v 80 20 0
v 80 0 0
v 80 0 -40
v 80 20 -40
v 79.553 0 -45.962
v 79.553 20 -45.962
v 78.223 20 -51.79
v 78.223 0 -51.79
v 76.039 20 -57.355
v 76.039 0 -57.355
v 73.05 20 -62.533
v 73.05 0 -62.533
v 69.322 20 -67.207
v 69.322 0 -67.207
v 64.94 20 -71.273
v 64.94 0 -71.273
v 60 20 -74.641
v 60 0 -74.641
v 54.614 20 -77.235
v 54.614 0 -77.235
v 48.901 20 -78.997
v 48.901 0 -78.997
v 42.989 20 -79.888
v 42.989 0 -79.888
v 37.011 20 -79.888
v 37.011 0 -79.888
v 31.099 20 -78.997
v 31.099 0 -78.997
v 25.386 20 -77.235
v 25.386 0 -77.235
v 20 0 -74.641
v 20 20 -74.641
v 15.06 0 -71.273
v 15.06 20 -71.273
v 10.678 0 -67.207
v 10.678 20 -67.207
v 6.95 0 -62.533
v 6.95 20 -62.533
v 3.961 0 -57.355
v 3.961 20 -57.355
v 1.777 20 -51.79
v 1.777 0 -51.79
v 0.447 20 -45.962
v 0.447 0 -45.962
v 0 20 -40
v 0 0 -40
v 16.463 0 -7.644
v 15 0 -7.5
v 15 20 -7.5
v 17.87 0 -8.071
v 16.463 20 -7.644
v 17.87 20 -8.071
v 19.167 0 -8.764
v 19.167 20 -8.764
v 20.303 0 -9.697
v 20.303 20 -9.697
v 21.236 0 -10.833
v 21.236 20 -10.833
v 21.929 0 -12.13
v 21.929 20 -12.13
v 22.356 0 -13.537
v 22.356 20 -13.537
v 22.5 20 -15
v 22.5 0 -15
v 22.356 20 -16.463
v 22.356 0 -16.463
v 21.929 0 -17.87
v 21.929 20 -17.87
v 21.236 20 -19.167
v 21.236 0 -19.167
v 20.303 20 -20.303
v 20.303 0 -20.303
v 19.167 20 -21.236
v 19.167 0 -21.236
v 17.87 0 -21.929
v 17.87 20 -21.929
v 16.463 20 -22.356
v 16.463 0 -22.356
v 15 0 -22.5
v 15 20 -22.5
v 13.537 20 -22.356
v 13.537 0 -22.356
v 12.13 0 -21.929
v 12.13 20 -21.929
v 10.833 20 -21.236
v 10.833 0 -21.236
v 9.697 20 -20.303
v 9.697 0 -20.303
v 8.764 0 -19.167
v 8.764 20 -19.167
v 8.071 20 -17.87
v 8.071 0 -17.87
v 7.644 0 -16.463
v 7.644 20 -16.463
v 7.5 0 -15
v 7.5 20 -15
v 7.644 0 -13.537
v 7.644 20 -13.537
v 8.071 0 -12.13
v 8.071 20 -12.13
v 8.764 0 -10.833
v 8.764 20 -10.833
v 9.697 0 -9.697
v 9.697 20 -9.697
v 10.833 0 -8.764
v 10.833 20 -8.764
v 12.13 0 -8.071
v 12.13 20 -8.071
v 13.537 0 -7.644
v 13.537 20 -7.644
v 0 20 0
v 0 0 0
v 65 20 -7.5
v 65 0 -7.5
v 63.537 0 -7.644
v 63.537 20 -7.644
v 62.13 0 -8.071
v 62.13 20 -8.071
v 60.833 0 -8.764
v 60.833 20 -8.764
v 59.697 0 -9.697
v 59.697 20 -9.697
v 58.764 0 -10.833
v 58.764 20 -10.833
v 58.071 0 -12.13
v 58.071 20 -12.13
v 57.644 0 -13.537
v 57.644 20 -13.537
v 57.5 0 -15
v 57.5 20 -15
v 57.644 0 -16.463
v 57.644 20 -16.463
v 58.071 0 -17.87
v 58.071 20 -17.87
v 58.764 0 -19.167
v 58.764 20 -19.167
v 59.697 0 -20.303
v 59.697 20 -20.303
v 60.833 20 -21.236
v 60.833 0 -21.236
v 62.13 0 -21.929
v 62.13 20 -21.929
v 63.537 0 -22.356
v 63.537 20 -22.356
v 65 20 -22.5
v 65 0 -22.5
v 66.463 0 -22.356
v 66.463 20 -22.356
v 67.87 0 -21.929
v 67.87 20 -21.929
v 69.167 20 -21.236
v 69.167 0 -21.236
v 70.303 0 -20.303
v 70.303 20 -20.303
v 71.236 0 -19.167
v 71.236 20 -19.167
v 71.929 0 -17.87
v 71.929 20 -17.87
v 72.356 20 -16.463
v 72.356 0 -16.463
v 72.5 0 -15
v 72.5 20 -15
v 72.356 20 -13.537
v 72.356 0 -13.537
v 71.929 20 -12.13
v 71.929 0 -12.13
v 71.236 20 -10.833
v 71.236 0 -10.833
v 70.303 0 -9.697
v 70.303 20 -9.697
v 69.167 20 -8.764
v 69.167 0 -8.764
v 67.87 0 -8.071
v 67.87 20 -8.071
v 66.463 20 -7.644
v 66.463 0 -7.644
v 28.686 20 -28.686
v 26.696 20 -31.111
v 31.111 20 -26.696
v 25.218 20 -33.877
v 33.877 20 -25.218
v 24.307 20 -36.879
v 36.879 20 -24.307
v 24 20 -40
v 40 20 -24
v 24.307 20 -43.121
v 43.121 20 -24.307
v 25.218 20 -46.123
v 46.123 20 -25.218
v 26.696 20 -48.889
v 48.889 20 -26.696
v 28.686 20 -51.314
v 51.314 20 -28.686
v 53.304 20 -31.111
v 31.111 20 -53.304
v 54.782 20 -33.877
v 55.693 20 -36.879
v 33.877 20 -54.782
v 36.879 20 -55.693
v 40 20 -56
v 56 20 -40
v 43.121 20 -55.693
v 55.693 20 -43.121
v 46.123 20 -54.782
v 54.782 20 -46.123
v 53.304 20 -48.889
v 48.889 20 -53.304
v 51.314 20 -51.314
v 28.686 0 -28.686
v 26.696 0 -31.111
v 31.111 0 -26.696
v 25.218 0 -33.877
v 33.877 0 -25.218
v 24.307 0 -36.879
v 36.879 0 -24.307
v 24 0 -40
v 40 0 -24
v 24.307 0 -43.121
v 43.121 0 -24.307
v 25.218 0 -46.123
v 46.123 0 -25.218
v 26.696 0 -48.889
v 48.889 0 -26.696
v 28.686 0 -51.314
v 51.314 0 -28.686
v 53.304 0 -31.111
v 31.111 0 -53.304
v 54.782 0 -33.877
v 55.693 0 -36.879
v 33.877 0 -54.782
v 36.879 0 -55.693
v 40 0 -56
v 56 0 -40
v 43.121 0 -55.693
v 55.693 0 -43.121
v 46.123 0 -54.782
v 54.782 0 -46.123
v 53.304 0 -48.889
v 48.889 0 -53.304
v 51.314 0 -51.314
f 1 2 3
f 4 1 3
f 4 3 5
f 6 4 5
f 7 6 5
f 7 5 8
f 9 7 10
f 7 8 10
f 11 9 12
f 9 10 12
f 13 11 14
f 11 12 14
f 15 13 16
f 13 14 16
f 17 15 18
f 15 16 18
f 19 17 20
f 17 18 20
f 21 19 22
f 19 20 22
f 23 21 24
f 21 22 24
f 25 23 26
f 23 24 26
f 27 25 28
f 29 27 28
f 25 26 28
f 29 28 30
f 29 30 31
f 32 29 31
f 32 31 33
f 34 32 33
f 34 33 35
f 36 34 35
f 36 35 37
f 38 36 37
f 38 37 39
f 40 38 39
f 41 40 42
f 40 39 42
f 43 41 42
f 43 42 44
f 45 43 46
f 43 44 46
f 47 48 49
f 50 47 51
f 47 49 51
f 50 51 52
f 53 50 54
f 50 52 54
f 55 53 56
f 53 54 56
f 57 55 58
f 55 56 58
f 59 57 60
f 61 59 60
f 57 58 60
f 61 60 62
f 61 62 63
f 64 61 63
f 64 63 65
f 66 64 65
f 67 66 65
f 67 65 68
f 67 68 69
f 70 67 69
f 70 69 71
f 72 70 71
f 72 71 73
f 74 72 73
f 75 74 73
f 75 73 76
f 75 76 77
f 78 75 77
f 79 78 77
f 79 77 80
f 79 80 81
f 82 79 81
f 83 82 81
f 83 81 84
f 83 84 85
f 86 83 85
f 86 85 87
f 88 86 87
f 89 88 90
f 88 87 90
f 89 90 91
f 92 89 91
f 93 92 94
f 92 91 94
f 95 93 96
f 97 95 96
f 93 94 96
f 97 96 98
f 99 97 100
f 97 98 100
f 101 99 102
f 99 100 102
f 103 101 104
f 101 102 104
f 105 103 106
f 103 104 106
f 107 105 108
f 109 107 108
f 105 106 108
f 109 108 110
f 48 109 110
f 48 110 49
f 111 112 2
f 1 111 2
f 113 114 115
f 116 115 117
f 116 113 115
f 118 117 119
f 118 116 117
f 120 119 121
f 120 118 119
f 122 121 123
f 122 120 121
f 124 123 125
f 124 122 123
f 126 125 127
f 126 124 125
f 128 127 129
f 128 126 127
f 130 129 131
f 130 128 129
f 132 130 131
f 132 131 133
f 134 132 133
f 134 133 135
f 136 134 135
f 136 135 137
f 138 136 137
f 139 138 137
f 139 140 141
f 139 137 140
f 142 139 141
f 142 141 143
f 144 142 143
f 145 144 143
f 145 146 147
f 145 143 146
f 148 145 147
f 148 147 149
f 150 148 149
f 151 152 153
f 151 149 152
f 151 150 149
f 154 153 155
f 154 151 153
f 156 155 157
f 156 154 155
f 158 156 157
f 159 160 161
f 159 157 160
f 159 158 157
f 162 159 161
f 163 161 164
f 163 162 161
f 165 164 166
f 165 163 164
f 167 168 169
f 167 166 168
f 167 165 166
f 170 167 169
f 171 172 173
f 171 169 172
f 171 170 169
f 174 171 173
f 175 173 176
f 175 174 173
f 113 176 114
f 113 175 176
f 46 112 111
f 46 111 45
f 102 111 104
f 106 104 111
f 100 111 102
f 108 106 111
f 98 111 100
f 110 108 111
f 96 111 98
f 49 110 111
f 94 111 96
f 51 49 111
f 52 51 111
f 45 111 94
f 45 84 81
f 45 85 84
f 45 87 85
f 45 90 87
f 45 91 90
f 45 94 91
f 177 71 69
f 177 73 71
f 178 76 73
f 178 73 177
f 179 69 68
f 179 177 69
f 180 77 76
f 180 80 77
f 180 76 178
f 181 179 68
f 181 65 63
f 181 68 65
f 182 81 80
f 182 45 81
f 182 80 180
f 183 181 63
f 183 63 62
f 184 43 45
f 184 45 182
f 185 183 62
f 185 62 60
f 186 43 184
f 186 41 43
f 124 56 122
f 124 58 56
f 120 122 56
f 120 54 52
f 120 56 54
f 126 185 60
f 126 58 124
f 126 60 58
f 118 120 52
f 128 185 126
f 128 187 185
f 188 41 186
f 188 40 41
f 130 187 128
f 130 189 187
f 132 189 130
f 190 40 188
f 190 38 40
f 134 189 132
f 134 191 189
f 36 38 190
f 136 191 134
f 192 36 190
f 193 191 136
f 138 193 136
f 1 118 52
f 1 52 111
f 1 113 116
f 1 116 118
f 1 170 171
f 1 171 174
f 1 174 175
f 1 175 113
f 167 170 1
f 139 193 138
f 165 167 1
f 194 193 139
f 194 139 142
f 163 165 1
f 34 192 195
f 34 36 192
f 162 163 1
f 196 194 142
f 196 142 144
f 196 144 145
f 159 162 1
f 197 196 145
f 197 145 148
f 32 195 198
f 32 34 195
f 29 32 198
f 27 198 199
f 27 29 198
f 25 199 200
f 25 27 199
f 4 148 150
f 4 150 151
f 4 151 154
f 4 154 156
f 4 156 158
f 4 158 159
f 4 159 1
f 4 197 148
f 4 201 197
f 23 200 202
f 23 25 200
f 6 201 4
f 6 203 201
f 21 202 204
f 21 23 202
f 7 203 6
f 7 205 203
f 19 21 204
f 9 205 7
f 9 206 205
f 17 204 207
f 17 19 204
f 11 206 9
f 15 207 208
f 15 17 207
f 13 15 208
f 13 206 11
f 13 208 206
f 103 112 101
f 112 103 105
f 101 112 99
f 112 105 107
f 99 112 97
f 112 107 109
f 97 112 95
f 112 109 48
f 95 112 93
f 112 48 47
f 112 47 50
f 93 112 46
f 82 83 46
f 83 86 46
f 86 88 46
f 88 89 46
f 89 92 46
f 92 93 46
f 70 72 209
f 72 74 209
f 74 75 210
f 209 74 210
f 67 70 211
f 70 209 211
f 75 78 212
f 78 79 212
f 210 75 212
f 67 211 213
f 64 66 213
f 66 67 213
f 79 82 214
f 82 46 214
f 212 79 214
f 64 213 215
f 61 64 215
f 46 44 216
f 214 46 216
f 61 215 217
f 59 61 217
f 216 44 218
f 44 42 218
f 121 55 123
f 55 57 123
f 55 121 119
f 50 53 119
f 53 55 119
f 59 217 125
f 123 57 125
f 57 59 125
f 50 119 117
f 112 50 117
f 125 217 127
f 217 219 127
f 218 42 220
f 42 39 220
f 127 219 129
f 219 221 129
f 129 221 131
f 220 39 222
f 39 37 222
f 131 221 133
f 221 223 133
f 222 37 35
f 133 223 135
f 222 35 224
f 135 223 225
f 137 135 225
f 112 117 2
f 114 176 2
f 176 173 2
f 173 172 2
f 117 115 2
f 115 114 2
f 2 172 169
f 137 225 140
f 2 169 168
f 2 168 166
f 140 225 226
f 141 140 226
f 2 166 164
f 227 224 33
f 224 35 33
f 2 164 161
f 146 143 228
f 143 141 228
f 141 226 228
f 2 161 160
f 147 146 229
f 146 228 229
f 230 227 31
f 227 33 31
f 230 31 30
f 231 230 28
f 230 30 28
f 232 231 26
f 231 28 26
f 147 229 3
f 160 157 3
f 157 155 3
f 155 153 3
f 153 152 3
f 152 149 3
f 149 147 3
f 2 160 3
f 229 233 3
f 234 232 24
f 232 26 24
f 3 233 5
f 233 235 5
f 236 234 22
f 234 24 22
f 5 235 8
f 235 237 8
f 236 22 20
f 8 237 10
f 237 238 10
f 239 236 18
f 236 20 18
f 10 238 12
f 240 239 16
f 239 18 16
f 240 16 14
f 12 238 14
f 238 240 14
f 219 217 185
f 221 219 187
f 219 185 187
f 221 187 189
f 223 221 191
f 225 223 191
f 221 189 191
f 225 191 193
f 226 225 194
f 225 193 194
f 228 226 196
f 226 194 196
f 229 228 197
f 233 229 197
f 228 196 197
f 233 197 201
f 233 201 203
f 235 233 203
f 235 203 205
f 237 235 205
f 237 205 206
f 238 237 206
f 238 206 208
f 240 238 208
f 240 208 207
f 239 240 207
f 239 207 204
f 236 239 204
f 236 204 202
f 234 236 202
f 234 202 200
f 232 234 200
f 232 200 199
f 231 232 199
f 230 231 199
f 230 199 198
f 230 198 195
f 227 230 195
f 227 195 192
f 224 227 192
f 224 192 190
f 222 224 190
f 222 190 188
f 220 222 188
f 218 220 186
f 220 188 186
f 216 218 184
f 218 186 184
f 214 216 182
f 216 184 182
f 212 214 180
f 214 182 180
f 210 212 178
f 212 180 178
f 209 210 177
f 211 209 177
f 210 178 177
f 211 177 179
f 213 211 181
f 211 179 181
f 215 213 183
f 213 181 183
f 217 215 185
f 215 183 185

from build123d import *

# Parameters (mm, degrees)
SKETCH1_R          = 40
SKETCH1_W          = 80
SKETCH1_H          = 40
EXTRUDE1_DEPTH     = 20
SKETCH3_R          = 16
CUT_EXTRUDE1_DEPTH = 115.891252931
SKETCH7_R          = 7.5
CUT_EXTRUDE2_DEPTH = 115.891252931


with BuildPart() as part:
    # Sketch1 → Extrude1 (new body)
    with BuildSketch(Plane(origin=(0, 0, 0), x_dir=(1, 0, 0), z_dir=(0, 1, 0))):
        with Locations((40, 40)):
            Circle(SKETCH1_R)
        with Locations((40, 20)):
            Rectangle(SKETCH1_W, SKETCH1_H)
    extrude(amount=EXTRUDE1_DEPTH)

    # Sketch3 → Cut-Extrude1 (cut, through all)
    with BuildSketch(Plane(origin=(0, 20, 0), x_dir=(1, 0, 0), z_dir=(0, 1, 0))):
        with Locations(Location((40, 40, 0), (0, 0, 270))):
            Circle(SKETCH3_R)
    extrude(amount=-CUT_EXTRUDE1_DEPTH, mode=Mode.SUBTRACT)

    # Sketch7 → Cut-Extrude2 (cut, through all)
    with BuildSketch(Plane(origin=(0, 20, 0), x_dir=(1, 0, 0), z_dir=(0, 1, 0))):
        with Locations(Location((15, 15, 0), (0, 0, 270))):
            Circle(SKETCH7_R)
    cut_extrude2 = extrude(amount=-CUT_EXTRUDE2_DEPTH, mode=Mode.SUBTRACT)

    # Mirror1: Cut-Extrude2 across plane
    add(cut_extrude2.mirror(Plane(origin=(40, 0, 0), x_dir=(0, 0, 1), z_dir=(1, 0, 0))), mode=Mode.SUBTRACT)


solid = part.part
